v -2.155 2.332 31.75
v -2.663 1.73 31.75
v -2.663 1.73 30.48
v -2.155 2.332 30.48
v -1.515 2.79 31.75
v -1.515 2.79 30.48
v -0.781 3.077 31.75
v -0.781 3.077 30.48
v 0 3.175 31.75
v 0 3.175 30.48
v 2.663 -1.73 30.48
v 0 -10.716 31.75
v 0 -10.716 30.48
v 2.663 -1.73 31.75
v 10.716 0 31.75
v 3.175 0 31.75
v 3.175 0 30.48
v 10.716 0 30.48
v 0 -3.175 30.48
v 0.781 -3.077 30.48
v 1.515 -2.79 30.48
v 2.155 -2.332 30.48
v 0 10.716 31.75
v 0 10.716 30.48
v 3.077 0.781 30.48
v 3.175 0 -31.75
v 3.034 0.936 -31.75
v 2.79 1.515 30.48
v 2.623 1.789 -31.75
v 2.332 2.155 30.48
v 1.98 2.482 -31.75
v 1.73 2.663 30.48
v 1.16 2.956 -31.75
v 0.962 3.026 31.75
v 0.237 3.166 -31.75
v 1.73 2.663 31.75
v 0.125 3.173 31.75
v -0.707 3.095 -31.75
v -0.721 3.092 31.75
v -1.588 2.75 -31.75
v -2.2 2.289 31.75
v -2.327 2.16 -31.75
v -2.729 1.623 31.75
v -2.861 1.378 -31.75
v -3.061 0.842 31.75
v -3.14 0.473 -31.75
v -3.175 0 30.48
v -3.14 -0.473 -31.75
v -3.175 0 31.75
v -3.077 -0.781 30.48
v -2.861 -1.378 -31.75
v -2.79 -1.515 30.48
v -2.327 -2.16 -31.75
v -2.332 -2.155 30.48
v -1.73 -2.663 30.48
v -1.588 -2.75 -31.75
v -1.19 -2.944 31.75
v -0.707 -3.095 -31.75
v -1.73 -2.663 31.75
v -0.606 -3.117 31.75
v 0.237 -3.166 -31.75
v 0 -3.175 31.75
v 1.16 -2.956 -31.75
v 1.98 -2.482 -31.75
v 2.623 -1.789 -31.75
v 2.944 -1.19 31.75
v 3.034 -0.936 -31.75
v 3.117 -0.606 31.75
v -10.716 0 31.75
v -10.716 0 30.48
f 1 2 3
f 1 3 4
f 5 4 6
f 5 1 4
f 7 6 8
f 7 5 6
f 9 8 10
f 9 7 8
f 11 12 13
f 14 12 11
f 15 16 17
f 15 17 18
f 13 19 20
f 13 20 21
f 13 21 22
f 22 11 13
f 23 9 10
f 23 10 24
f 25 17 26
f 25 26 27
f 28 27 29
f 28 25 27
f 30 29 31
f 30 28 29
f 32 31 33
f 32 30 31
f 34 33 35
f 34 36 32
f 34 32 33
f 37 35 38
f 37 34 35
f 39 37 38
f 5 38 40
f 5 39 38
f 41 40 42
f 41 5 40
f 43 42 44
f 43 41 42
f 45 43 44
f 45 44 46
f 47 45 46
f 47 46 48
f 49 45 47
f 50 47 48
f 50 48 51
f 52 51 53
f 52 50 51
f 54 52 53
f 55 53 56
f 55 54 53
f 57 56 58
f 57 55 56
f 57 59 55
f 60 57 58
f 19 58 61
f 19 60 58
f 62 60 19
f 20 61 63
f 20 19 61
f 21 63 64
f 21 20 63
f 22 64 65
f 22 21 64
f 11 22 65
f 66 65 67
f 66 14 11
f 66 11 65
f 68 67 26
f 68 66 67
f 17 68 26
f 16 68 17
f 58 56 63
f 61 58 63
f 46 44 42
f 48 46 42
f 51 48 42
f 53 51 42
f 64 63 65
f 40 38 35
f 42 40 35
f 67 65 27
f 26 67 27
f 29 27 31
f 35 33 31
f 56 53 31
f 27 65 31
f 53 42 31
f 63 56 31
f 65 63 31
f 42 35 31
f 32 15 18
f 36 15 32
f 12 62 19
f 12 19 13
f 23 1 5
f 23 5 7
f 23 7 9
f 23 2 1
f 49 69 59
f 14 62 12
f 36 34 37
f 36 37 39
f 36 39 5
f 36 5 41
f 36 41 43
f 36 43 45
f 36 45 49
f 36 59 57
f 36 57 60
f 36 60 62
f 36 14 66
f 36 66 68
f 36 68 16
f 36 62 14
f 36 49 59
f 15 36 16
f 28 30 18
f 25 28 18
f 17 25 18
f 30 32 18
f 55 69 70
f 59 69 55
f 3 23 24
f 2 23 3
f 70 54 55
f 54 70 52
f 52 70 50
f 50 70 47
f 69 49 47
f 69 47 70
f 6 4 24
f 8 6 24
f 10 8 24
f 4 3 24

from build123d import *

# Parameters (mm, degrees)
F0_R          = 3.175
F1_DEPTH      = 31.75
F1_DEPTH_BACK = 31.75
F3_DEPTH      = 1.27
F4_DEPTH      = 1.27
F5_DEPTH      = 1.27
F6_DEPTH      = 1.27


with BuildPart() as f1:
    # F0 (on Top) → F1 (new body, two sides)
    with BuildSketch(Plane.XY) as f1_sk:
        Circle(F0_R)
    extrude(amount=F1_DEPTH)
    extrude(f1_sk.sketch, amount=-F1_DEPTH_BACK)

    # F2 (on face) → F4 (join)
    with BuildSketch(Plane.XY.offset(31.75)):
        with BuildLine():
            ThreePointArc((-1.729649, -2.662506), (-2.790364, -1.514759), (-3.175, 0))
            Line((-3.175, 0), (-10.715519, 0))
            Line((-10.715519, 0), (-1.729649, -2.662506))
        make_face()
    extrude(amount=-F4_DEPTH)

    # F2 (on face) → F5 (join)
    with BuildSketch(Plane.XY.offset(31.75)):
        with BuildLine():
            ThreePointArc((2.662506, -1.729649), (1.514759, -2.790364), (0, -3.175))
            Line((0, -3.175), (0, -10.715519))
            Line((0, -10.715519), (2.662506, -1.729649))
        make_face()
    extrude(amount=-F5_DEPTH)

    # F2 (on face) → F6 (join)
    with BuildSketch(Plane.XY.offset(31.75)):
        with BuildLine():
            Line((10.715519, 0), (1.729649, 2.662506))
            ThreePointArc((1.729649, 2.662506), (2.790364, 1.514759), (3.175, 0))
            Line((3.175, 0), (10.715519, 0))
        make_face()
    extrude(amount=-F6_DEPTH)


with BuildPart() as f3:
    # F2 (on face) → F3 (new body)
    with BuildSketch(Plane.XY.offset(31.75)):
        with BuildLine():
            Line((0, 10.715519), (-2.662506, 1.729649))
            ThreePointArc((-2.662506, 1.729649), (-1.514759, 2.790364), (0, 3.175))
            Line((0, 3.175), (0, 10.715519))
        make_face()
    extrude(amount=-F3_DEPTH)


solid = Compound([f1.part, f3.part])
